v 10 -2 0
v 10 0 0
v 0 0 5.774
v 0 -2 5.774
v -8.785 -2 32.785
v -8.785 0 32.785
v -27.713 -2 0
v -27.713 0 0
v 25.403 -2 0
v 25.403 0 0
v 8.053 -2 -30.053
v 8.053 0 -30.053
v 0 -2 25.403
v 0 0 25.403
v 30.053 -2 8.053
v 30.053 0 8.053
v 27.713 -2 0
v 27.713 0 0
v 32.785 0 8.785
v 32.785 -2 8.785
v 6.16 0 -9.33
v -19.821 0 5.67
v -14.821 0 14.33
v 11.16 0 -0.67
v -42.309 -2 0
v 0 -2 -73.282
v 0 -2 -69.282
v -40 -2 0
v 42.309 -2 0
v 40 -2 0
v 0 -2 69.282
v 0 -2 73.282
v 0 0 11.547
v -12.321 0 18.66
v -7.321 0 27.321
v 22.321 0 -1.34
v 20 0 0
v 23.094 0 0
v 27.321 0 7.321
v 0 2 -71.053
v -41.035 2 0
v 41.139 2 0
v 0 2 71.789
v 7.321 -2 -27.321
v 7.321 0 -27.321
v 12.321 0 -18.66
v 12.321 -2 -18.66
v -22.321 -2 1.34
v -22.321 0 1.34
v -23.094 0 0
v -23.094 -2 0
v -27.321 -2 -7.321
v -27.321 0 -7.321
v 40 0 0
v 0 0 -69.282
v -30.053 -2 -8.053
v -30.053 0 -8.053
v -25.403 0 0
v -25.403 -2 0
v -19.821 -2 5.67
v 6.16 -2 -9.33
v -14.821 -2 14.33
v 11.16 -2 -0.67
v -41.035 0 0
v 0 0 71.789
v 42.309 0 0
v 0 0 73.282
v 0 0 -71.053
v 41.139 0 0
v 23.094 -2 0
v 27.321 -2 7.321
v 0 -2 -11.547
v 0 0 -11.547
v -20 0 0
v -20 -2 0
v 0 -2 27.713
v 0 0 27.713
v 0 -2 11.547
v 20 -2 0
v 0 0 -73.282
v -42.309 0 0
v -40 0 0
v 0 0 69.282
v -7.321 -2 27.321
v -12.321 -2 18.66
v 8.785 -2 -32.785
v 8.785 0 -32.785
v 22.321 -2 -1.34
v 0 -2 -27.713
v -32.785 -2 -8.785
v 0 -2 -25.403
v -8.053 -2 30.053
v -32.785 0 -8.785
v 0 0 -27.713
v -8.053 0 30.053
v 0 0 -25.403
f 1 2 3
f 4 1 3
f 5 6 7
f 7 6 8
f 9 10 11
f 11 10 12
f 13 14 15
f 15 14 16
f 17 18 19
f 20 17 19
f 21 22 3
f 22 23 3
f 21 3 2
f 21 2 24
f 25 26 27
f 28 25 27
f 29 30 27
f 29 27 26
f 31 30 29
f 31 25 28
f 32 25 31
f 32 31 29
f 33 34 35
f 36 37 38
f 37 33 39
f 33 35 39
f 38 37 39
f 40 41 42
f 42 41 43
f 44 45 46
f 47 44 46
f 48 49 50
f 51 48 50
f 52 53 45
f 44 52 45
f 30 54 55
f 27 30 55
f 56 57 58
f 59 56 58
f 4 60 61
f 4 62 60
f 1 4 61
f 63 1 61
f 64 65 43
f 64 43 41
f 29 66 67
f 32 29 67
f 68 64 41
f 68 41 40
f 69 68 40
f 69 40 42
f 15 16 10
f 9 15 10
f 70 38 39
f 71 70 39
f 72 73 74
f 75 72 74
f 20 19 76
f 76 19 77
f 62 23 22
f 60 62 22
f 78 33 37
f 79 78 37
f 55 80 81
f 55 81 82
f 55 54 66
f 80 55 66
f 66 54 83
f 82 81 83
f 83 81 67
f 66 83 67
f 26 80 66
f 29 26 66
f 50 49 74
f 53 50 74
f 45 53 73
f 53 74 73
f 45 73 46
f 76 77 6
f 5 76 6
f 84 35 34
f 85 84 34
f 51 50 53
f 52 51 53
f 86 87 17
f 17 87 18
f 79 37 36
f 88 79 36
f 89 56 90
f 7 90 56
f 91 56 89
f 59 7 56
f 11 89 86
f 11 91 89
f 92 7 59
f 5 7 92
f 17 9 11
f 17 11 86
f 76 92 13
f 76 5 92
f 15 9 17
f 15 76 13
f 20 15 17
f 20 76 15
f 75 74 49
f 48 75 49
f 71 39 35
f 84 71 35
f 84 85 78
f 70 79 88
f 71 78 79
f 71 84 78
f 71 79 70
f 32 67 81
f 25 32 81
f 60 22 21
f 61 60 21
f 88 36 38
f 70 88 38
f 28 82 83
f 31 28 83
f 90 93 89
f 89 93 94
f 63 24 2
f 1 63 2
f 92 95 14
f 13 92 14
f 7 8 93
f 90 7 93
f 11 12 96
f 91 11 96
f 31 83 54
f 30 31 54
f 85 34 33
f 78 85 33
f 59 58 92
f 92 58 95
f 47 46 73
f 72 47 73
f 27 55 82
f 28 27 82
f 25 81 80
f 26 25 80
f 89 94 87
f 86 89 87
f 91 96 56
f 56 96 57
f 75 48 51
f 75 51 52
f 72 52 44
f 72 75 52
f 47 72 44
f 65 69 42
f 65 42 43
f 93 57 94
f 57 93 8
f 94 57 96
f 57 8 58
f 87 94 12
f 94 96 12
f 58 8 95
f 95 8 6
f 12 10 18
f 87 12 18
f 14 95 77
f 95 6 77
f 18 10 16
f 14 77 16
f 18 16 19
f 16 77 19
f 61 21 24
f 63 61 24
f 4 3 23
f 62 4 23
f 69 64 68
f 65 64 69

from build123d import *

# Parameters (mm, degrees)
F1_DEPTH = 2
F3_DEPTH = 2


with BuildPart() as f1:
    # F0 (on Front) → F1 (new body)
    with BuildSketch(Plane.XZ):
        Polygon((0, 73.2820323028), (-42.3094010768, 0), (0, -73.2820323028), (42.3094010768, 0), align=None)
        Polygon((40, 0), (0, -69.2820323028), (-40, 0), (0, 69.2820323028), align=None, mode=Mode.SUBTRACT)
    extrude(amount=F1_DEPTH)


with BuildPart() as f1b:
    # F0 (on Front) → F1, piece 2 (new body)
    with BuildSketch(Plane.XZ):
        Polygon((-27.7128129211, 0), (-25.4034118443, 0), (-8.0525588833, 30.0525588833), (0, 25.4034118443), (0, 27.7128129211), (-8.7846096908, 32.7846096908), align=None)
        Polygon((30.0525588833, 8.0525588833), (25.4034118443, 0), (27.7128129211, 0), (32.7846096908, 8.7846096908), (0, 27.7128129211), (0, 25.4034118443), align=None)
        Polygon((8.0525588833, -30.0525588833), (0, -25.4034118443), (0, -27.7128129211), (8.7846096908, -32.7846096908), (27.7128129211, 0), (25.4034118443, 0), align=None)
        Polygon((0, -27.7128129211), (0, -25.4034118443), (-30.0525588833, -8.0525588833), (-25.4034118443, 0), (-27.7128129211, 0), (-32.7846096908, -8.7846096908), align=None)
    extrude(amount=F1_DEPTH)


with BuildPart() as f1c:
    # F0 (on Front) → F1, piece 3 (new body)
    with BuildSketch(Plane.XZ):
        Polygon((-19.8205080757, 5.6698729811), (-10, 0), (0, 0), (0, 5.7735026919), (-14.8205080757, 14.3301270189), align=None)
        Polygon((-10, 0), (0, -5.7735026919), (0, 0), align=None)
        Polygon((0, 0), (0, -5.7735026919), (6.1602540378, -9.3301270189), (11.1602540378, -0.6698729811), (10, 0), align=None)
        Polygon((0, 5.7735026919), (0, 0), (10, 0), align=None)
    extrude(amount=F1_DEPTH)


with BuildPart() as f1d:
    # F0 (on Front) → F1, piece 4 (new body)
    with BuildSketch(Plane.XZ):
        Polygon((20, 0), (23.0940107676, 0), (27.3205080757, 7.3205080757), (0, 23.0940107676), (0, 11.5470053838), align=None)
        Polygon((-12.3205080757, 18.6602540378), (0, 11.5470053838), (0, 23.0940107676), (-7.3205080757, 27.3205080757), align=None)
        Polygon((22.3205080757, -1.3397459622), (23.0940107676, 0), (20, 0), align=None)
    extrude(amount=F1_DEPTH)


with BuildPart() as f1e:
    # F0 (on Front) → F1, piece 5 (new body)
    with BuildSketch(Plane.XZ):
        Polygon((0, -23.0940107676), (7.3205080757, -27.3205080757), (12.3205080757, -18.6602540378), (0, -11.5470053838), align=None)
        Polygon((-27.3205080757, -7.3205080757), (0, -23.0940107676), (0, -11.5470053838), (-20, 0), (-23.0940107676, 0), align=None)
        Polygon((-22.3205080757, 1.3397459622), (-23.0940107676, 0), (-20, 0), align=None)
    extrude(amount=F1_DEPTH)


with BuildPart() as f3:
    # F2 (on Front) → F3 (new body)
    with BuildSketch(Plane.XZ):
        Polygon((0, 71.7891380191), (-41.0352908075, 0), (0, -71.0530355573), (41.1385819316, 0), align=None)
    extrude(amount=-F3_DEPTH)


solid = Compound([f1.part, f1b.part, f1c.part, f1d.part, f1e.part, f3.part])
